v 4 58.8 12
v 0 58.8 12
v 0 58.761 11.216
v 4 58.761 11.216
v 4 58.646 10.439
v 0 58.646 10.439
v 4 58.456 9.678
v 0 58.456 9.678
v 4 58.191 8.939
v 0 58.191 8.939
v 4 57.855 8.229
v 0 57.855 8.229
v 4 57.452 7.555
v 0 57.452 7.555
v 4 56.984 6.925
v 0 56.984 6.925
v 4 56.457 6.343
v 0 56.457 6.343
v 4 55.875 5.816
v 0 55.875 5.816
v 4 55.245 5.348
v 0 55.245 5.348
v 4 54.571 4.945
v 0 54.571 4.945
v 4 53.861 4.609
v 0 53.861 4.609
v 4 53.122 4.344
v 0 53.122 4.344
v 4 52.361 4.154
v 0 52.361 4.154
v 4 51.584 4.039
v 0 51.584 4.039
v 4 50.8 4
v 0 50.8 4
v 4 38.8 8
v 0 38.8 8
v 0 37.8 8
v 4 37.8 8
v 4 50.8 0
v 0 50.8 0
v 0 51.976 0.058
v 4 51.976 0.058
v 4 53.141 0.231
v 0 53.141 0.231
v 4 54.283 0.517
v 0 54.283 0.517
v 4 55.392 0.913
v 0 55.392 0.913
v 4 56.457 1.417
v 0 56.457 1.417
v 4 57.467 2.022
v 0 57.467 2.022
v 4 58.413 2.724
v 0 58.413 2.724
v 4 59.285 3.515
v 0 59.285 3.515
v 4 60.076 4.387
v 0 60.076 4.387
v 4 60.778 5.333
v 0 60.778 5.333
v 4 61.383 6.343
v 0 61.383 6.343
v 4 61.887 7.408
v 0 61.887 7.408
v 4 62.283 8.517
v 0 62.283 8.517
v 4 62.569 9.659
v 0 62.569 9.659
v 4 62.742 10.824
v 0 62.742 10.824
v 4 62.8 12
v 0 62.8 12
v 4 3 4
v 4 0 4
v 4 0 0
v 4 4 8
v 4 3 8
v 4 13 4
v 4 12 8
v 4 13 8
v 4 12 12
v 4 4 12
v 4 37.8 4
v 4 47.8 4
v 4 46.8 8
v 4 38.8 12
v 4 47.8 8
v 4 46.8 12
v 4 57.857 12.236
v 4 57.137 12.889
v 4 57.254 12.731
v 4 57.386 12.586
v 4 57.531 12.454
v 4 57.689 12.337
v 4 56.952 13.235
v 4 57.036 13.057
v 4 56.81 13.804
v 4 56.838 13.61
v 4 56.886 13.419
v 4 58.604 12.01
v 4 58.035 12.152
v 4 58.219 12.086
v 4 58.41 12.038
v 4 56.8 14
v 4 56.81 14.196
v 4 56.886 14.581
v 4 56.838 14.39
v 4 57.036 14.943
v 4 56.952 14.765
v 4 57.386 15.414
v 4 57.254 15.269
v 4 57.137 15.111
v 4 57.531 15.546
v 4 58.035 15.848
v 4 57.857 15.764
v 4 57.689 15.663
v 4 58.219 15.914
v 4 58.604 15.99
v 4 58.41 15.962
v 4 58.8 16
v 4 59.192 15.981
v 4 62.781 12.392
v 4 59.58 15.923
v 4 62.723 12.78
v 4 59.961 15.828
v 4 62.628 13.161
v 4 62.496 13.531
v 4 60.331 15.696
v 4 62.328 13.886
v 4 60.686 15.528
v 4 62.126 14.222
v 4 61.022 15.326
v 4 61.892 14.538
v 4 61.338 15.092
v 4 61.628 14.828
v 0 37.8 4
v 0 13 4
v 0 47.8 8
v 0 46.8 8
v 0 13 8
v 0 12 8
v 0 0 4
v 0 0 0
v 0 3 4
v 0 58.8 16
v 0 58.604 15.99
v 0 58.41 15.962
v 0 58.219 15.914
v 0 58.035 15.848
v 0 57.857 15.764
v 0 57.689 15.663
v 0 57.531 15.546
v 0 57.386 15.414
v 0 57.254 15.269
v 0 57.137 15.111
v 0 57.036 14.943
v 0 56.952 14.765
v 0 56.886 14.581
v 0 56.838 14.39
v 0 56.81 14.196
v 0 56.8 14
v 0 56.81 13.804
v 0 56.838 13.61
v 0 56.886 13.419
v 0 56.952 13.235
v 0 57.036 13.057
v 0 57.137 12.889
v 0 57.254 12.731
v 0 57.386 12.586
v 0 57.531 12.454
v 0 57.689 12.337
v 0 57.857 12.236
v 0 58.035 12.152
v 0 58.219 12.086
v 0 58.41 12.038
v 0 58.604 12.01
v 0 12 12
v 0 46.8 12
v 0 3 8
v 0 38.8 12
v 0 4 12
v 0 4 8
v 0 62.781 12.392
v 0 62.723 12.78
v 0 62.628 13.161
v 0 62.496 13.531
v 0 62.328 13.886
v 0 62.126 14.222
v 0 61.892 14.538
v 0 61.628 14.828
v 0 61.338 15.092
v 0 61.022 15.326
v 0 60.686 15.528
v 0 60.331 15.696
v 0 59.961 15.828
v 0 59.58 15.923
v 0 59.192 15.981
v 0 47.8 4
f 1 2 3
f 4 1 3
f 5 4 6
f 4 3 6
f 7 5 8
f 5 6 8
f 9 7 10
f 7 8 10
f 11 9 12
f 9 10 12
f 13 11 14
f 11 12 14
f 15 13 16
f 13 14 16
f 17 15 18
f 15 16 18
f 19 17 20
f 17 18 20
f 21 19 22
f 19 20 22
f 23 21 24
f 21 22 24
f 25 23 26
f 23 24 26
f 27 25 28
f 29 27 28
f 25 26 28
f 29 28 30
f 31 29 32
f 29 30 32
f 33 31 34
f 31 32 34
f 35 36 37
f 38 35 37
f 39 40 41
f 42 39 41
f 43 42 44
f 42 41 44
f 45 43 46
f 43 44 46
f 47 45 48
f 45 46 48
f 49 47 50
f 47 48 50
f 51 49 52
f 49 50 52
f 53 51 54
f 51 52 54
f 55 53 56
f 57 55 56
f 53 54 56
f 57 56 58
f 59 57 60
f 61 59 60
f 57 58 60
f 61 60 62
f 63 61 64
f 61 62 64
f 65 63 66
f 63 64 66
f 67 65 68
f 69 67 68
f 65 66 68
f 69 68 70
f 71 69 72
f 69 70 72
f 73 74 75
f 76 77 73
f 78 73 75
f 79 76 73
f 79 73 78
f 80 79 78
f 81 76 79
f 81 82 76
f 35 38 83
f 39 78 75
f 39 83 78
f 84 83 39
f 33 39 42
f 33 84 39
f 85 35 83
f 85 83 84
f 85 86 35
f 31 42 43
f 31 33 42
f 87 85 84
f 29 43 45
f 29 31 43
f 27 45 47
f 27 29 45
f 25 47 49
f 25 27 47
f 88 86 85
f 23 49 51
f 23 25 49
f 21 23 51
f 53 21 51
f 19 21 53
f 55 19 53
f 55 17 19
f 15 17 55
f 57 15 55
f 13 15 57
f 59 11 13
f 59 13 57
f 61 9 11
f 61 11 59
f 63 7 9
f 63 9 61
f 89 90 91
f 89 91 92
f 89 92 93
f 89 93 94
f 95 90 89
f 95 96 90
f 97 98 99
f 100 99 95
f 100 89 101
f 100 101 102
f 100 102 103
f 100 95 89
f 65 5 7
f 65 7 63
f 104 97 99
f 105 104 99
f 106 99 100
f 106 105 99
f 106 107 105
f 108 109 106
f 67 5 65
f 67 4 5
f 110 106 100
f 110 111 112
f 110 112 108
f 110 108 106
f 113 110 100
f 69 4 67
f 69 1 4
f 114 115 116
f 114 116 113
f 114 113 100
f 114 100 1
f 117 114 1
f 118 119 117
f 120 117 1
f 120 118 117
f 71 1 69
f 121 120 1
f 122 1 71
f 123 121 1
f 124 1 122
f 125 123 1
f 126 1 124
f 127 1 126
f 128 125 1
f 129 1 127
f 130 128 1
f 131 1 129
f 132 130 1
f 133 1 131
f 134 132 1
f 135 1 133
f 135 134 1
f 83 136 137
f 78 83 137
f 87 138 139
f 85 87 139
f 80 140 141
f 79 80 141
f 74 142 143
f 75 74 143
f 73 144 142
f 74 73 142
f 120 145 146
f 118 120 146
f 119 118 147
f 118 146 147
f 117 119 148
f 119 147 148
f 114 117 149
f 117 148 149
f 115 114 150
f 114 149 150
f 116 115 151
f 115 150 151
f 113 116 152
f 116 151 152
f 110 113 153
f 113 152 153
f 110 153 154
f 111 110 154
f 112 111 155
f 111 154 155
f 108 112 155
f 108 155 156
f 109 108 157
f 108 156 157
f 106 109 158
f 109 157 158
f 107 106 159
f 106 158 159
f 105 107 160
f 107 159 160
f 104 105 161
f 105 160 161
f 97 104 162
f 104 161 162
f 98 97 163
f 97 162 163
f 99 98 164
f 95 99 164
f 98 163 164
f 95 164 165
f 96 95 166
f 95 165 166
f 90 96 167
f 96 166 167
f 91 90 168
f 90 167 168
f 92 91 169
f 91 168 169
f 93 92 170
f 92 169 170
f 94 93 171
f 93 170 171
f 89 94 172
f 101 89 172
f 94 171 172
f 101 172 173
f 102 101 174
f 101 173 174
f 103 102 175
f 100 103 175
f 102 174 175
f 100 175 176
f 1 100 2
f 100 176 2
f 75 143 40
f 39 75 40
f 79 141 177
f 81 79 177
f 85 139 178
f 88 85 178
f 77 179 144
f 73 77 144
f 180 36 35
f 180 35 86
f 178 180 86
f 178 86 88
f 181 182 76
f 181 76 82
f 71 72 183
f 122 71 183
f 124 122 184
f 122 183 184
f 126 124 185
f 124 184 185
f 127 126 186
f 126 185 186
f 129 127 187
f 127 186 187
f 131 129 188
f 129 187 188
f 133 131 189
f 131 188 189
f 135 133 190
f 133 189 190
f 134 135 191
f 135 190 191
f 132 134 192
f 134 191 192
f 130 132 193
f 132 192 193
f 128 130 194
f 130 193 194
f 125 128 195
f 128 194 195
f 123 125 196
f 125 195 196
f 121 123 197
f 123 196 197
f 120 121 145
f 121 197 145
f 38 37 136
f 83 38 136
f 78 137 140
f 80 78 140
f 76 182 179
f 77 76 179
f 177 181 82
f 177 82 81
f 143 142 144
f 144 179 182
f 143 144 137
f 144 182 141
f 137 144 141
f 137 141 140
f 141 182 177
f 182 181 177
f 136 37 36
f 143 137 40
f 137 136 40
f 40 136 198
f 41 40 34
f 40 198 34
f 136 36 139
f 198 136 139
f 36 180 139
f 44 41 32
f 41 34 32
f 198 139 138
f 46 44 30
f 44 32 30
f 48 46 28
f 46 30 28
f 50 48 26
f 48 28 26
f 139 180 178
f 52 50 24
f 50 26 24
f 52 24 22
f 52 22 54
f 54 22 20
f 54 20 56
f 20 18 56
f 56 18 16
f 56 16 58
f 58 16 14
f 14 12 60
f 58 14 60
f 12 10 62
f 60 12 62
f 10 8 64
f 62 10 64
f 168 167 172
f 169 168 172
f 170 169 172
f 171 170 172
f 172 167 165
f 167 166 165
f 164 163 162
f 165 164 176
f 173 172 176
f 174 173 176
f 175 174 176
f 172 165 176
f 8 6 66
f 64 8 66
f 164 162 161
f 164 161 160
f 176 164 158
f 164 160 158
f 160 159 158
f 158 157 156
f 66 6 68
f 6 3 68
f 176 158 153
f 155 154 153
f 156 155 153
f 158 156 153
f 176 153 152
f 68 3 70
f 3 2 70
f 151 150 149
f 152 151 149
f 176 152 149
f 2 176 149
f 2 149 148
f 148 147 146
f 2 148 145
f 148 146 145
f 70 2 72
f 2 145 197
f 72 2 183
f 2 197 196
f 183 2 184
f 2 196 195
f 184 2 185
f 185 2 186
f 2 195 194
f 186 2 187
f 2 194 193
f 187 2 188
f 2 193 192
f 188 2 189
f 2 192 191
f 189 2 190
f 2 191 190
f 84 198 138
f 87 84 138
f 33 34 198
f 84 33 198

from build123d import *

# Parameters (mm, degrees)
F0_W     = 8
F0_H     = 4
F1_DEPTH = 4


with BuildPart() as f1:
    # F0 (on Right) → F1 (new body)
    with BuildSketch(Plane.YZ):
        with BuildLine():
            Line((0, 4), (0, 0))
            Line((0, 0), (50.8, 0))
            ThreePointArc((50.8, 0), (59.285281, 3.514719), (62.8, 12))
            ThreePointArc((62.8, 12), (61.628427, 14.828427), (58.8, 16))
            ThreePointArc((58.8, 16), (56.8, 14), (58.8, 12))
            ThreePointArc((58.8, 12), (56.456854, 6.343146), (50.8, 4))
            Line((50.8, 4), (47.8, 4))
            Line((47.8, 4), (37.8, 4))
            Line((37.8, 4), (13, 4))
            Line((13, 4), (3, 4))
            Line((3, 4), (0, 4))
        make_face()
        Polygon((3, 8), (3, 4), (13, 4), (13, 8), (12, 8), (4, 8), align=None)
        Polygon((37.8, 8), (37.8, 4), (47.8, 4), (47.8, 8), (46.8, 8), (38.8, 8), align=None)
        with Locations((8, 10)):
            Rectangle(F0_W, F0_H)
        with Locations((42.8, 10)):
            Rectangle(F0_W, F0_H)
    extrude(amount=F1_DEPTH)


solid = f1.part
